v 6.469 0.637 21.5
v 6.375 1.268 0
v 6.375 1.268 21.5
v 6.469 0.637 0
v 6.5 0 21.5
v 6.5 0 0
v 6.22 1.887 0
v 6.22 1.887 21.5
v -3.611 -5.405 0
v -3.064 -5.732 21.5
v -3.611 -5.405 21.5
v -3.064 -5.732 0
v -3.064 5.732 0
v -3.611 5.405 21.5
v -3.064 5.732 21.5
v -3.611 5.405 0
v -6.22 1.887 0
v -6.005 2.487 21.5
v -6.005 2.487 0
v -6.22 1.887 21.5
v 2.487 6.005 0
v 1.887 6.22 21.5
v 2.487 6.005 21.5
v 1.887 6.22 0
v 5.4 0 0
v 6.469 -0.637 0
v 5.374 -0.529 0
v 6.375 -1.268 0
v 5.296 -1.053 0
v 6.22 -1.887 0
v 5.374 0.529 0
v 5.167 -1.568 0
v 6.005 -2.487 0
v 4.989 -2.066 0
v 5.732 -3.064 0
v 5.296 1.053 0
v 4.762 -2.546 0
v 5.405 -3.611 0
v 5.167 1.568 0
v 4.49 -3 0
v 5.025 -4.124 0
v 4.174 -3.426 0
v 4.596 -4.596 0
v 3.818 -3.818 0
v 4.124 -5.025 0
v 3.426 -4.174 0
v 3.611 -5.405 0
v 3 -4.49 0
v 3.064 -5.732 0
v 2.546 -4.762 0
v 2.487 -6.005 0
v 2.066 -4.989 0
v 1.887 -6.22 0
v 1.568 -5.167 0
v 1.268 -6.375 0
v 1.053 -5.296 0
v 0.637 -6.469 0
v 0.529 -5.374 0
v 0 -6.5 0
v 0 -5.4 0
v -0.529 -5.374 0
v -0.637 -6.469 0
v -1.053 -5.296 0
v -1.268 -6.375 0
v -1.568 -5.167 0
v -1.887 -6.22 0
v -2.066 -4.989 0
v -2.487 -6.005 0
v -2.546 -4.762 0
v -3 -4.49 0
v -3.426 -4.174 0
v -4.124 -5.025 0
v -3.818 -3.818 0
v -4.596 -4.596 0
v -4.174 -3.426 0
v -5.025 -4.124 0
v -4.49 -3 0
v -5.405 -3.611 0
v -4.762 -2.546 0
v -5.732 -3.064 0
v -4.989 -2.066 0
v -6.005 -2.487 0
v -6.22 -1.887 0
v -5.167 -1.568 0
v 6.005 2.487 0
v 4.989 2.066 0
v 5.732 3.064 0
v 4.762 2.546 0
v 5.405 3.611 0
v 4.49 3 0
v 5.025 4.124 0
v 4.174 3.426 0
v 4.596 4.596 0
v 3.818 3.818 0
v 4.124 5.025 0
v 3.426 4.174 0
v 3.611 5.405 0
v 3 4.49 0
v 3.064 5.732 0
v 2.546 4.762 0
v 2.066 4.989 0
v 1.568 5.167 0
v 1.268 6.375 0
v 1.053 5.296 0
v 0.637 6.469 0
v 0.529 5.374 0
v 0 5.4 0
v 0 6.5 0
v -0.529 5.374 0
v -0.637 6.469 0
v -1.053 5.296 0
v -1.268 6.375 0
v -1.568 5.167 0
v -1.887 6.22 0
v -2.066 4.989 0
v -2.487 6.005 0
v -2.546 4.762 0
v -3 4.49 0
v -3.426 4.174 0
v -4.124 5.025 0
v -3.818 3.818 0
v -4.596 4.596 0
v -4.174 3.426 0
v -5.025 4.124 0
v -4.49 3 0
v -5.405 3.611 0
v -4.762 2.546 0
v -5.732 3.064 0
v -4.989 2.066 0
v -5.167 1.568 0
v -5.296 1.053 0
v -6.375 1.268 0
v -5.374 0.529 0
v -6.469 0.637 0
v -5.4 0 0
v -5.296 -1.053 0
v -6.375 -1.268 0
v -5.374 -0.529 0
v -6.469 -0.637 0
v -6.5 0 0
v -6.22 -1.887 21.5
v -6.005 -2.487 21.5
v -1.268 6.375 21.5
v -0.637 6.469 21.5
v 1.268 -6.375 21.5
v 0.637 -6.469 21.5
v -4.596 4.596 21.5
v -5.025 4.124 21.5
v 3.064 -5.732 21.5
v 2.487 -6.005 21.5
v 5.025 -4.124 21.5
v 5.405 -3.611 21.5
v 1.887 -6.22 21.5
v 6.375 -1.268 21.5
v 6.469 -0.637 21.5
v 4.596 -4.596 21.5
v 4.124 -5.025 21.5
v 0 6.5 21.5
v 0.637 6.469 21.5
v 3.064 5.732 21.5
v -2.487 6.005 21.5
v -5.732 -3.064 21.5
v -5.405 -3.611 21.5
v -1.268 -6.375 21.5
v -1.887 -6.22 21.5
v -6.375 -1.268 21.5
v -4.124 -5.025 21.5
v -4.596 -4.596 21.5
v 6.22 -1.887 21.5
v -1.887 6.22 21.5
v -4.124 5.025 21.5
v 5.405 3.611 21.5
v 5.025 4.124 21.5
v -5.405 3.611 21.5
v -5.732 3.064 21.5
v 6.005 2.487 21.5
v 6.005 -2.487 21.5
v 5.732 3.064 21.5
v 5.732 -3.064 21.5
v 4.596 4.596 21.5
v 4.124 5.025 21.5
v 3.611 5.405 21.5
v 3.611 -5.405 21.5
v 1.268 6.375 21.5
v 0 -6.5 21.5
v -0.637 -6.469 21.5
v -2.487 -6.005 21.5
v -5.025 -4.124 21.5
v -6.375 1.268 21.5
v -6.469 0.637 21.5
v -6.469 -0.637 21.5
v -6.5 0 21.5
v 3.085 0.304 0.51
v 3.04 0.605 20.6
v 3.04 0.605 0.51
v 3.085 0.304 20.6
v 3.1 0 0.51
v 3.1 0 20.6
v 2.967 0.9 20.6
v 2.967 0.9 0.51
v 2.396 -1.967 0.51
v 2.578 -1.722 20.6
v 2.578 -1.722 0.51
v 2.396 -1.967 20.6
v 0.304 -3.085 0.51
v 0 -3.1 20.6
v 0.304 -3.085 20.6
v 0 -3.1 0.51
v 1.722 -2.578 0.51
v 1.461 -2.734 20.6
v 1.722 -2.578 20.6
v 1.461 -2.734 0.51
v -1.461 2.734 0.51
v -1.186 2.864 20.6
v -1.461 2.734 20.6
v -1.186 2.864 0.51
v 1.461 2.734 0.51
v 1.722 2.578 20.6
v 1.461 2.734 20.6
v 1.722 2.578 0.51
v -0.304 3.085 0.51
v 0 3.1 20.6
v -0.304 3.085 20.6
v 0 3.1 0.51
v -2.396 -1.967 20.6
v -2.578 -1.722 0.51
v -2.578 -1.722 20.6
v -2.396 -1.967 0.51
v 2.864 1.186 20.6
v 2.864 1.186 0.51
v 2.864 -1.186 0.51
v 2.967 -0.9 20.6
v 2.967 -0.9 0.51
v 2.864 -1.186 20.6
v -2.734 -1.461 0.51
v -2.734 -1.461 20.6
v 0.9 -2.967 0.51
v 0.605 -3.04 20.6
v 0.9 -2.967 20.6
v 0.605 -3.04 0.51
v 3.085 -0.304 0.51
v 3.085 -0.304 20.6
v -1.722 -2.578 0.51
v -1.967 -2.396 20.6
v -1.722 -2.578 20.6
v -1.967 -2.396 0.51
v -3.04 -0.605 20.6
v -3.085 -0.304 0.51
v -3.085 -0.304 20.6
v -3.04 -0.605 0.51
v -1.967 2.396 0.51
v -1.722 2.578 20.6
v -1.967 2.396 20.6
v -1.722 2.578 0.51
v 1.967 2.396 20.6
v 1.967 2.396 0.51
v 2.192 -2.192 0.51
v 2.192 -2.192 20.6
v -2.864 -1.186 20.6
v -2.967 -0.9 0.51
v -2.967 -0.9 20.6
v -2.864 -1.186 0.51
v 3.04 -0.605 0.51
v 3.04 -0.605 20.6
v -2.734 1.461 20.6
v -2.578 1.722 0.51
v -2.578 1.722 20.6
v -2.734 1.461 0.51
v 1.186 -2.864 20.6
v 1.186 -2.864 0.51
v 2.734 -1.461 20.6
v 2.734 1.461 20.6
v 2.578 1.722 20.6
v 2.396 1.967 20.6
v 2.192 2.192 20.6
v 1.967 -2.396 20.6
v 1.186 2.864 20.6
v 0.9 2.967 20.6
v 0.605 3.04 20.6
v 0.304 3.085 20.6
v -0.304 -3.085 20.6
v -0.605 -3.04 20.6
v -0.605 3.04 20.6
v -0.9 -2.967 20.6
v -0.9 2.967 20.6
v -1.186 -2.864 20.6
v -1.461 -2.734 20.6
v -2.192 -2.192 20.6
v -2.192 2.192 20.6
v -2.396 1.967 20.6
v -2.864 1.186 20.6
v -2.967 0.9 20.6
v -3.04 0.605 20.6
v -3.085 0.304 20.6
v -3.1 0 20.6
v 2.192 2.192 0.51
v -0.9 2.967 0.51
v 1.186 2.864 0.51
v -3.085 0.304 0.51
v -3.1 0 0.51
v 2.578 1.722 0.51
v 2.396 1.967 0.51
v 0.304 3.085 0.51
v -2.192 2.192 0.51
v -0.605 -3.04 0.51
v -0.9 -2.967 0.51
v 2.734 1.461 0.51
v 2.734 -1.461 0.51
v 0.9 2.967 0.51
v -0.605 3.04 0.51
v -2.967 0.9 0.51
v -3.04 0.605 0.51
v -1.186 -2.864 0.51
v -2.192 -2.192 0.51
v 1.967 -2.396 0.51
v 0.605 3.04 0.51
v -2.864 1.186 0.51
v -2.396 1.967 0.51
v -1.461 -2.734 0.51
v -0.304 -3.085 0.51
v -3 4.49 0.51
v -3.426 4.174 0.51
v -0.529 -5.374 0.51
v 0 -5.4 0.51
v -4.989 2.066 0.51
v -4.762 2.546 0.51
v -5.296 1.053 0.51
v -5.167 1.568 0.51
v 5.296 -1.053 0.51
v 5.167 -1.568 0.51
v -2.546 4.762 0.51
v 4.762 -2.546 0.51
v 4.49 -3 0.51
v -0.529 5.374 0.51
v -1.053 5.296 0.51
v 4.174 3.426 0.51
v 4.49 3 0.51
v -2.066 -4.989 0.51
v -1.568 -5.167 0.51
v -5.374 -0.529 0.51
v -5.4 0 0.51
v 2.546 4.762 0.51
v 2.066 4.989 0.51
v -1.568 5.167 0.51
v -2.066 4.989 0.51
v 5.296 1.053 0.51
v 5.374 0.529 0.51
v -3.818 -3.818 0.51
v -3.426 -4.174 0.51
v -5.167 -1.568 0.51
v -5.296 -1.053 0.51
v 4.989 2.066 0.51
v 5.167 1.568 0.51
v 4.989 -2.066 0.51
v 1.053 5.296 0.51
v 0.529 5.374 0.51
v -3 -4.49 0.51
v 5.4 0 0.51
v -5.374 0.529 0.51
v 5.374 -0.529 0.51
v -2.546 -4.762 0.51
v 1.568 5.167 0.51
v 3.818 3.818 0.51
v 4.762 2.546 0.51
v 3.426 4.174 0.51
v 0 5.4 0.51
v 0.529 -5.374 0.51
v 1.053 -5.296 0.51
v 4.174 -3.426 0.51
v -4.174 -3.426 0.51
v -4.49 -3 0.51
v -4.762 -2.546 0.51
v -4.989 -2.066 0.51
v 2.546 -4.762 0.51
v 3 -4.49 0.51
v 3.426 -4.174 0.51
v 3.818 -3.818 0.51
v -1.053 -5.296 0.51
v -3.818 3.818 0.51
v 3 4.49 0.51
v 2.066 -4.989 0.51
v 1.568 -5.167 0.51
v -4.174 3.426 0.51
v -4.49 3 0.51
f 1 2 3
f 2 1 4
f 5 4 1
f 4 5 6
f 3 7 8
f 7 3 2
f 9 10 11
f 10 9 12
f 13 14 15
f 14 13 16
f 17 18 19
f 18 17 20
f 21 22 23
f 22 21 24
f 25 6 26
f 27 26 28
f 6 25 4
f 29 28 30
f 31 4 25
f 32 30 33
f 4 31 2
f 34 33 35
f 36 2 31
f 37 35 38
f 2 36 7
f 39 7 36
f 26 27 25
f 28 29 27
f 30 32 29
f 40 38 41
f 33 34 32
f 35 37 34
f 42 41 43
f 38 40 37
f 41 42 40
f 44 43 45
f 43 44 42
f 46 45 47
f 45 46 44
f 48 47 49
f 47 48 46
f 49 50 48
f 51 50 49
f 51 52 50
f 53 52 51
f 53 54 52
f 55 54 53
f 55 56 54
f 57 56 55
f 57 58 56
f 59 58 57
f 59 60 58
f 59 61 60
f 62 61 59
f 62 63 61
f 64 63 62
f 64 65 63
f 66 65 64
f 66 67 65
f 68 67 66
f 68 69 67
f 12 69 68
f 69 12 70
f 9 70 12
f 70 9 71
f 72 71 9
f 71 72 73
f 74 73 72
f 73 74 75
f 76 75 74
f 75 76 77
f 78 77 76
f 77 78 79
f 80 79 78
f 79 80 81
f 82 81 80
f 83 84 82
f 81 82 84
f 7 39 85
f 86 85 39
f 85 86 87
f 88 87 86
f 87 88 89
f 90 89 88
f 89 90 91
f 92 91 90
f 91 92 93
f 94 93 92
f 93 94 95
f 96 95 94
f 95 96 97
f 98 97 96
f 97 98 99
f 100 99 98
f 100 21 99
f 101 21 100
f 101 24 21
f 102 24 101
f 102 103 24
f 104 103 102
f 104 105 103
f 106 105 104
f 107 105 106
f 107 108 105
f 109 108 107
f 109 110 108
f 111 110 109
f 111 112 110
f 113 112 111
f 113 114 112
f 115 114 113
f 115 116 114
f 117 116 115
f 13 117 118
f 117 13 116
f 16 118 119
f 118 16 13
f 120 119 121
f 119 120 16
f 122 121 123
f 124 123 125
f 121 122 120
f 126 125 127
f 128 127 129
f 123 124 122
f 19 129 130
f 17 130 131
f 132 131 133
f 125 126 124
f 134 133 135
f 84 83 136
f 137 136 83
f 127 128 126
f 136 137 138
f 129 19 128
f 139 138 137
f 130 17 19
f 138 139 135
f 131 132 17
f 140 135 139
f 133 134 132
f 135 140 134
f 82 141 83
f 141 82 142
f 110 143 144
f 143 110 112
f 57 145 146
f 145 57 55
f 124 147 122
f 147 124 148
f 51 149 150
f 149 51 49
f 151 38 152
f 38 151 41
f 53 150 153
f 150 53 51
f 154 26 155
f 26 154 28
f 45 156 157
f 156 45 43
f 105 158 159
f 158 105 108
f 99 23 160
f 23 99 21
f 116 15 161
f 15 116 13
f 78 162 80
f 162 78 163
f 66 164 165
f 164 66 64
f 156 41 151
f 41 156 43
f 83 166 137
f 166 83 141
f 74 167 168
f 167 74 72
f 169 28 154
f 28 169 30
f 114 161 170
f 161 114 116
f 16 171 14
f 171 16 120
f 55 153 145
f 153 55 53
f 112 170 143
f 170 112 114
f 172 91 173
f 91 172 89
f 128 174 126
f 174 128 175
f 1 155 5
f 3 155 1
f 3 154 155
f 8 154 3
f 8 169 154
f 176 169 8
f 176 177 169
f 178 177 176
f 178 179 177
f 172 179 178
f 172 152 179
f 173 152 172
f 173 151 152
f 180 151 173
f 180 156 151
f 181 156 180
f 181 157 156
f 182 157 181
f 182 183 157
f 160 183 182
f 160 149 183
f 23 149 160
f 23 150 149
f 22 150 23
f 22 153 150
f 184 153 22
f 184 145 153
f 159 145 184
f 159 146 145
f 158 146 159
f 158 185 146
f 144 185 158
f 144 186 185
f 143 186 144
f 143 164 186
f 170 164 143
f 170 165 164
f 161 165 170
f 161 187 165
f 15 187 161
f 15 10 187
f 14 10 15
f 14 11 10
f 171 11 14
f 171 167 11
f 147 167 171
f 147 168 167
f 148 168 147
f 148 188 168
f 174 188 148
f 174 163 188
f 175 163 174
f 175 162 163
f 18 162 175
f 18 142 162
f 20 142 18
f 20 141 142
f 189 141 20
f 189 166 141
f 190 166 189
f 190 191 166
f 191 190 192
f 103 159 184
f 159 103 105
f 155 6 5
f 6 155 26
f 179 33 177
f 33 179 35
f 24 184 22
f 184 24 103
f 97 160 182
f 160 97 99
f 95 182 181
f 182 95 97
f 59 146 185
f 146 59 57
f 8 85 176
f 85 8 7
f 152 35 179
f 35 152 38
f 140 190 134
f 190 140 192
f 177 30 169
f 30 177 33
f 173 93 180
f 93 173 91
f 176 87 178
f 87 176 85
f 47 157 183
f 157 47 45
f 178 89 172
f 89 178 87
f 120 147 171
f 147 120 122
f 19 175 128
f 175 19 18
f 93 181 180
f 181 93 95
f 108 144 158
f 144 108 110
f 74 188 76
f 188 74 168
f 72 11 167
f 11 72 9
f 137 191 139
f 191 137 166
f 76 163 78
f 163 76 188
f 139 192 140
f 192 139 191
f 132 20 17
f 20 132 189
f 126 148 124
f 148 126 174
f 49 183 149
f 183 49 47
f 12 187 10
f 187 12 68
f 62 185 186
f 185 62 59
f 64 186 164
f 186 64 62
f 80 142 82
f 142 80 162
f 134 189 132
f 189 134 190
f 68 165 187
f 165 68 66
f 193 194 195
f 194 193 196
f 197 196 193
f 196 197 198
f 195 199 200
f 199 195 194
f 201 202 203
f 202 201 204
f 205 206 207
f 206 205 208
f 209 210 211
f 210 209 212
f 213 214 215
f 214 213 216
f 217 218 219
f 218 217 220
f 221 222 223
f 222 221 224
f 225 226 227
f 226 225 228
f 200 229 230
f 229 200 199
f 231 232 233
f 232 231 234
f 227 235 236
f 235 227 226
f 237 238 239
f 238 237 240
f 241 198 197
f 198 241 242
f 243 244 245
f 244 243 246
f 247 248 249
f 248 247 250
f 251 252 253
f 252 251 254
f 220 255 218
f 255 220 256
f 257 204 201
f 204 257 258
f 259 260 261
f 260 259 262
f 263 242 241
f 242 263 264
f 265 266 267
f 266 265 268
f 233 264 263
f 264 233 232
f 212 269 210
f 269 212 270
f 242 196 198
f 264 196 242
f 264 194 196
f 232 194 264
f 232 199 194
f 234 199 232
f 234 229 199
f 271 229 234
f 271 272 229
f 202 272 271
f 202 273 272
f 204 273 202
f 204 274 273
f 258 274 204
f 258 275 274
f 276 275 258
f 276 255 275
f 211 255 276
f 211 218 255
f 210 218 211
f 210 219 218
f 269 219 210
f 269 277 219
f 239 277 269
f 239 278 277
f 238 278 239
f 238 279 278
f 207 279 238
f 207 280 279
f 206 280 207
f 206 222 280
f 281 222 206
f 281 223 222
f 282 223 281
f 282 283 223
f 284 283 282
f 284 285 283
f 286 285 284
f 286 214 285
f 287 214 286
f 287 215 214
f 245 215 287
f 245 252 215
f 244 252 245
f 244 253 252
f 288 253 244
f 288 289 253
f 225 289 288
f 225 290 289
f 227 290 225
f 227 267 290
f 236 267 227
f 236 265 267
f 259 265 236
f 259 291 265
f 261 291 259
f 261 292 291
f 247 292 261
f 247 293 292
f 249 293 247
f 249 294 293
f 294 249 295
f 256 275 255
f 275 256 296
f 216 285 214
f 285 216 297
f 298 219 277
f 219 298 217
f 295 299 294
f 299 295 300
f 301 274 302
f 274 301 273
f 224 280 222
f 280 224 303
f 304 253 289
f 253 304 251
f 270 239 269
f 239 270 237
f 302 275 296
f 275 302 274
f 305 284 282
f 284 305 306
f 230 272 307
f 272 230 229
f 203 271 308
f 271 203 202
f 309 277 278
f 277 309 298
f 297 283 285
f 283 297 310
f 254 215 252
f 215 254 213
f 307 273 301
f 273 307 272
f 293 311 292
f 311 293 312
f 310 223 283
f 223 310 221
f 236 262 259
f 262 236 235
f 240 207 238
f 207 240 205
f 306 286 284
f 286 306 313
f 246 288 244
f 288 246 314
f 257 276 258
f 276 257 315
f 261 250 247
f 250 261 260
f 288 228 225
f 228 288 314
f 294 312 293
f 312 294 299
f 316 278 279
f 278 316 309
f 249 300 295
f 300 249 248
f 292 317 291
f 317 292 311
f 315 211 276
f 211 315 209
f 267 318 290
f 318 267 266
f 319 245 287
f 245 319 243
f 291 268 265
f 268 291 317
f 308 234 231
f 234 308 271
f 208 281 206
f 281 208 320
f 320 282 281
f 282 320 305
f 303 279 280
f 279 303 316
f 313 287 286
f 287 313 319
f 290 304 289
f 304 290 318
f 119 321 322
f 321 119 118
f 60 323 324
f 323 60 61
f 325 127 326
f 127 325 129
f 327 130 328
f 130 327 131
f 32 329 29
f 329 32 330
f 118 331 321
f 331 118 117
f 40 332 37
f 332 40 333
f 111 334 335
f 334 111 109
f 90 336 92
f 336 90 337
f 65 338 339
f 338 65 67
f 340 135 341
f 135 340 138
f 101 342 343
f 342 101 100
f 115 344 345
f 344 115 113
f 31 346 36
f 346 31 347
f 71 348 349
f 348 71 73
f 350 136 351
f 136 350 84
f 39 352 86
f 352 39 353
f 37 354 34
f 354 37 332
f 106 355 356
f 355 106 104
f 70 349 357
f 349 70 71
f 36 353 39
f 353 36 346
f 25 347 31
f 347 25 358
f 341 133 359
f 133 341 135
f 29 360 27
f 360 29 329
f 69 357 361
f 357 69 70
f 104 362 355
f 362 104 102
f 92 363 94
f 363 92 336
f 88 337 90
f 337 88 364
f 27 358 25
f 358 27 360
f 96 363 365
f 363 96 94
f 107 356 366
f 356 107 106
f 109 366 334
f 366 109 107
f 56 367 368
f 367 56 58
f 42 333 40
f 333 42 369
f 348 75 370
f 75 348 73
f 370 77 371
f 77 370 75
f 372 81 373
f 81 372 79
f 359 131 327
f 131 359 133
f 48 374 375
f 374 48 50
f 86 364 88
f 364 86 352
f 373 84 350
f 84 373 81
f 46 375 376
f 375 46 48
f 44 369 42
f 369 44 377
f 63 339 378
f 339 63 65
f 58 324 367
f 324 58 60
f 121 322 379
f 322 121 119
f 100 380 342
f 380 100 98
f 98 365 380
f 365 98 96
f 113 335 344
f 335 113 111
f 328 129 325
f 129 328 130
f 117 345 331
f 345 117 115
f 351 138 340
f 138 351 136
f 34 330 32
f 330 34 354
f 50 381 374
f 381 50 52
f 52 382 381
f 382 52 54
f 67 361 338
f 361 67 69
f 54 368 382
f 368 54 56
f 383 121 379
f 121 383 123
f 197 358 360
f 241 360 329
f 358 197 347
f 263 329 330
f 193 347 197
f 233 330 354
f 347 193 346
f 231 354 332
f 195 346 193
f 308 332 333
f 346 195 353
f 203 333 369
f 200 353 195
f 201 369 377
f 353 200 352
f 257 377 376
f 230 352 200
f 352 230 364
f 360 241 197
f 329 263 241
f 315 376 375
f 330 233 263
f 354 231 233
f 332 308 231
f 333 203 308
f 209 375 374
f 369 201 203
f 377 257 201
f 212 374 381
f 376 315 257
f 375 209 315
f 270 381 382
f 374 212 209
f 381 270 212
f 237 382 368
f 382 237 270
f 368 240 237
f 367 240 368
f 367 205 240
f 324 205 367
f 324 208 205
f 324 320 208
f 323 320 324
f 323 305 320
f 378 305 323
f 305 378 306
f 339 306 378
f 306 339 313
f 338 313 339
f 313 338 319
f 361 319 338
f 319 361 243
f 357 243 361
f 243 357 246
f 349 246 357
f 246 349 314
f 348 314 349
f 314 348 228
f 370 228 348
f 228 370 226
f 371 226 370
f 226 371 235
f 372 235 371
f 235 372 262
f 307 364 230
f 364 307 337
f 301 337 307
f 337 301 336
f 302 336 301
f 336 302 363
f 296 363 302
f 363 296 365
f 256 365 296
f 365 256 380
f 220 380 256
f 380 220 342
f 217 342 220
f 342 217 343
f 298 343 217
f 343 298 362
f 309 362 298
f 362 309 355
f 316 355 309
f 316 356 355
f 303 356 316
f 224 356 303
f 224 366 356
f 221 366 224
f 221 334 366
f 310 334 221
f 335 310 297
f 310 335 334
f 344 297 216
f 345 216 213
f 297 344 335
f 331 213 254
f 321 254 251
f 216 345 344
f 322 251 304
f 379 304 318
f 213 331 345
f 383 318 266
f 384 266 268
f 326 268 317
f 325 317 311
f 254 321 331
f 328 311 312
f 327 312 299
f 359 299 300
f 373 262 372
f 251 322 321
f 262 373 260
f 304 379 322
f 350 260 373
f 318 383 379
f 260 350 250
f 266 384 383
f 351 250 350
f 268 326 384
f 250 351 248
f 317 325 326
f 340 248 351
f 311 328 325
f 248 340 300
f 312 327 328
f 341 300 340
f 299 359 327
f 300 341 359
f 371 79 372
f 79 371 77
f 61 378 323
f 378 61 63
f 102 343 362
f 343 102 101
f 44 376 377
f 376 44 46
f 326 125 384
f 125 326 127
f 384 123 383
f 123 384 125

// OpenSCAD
// PCR Tube Adapter Sleeve - fits 0.2mL tubes into 1.5mL rack holes.
// Print orientation: Collar on bed (z=0 to 1.5), body rises to z=21.5.

// Dimensions
collar_od = 13;
collar_t  = 1.5;
body_od   = 10.8;
top_z     = 21.5;
bore_d    = 6.2;

$fn = 64;

difference() {
    // Main body: Cylinder from z=0 to z=top_z (21.5)
    translate([0, 0, 0]) 
        cylinder(h = top_z, d = collar_od);
    
    // Cut out the bore through the entire height
    // Extend slightly past top_z to ensure the hole is fully open at the top surface
    translate([0, 0, -1]) 
        cylinder(h = top_z + 0.1, d = bore_d);
    
    // Cut out the collar area to create the step down to the body OD
    // The collar sits on the bed (z=0 to 1.5). We cut a cylinder from z=0 to z=1.5
    // with diameter = body_od. We extend slightly past the collar top (1.5) to ensure the step is clean.
    translate([0, 0, -1]) 
        cylinder(h = collar_t + 0.01, d = body_od);
}
